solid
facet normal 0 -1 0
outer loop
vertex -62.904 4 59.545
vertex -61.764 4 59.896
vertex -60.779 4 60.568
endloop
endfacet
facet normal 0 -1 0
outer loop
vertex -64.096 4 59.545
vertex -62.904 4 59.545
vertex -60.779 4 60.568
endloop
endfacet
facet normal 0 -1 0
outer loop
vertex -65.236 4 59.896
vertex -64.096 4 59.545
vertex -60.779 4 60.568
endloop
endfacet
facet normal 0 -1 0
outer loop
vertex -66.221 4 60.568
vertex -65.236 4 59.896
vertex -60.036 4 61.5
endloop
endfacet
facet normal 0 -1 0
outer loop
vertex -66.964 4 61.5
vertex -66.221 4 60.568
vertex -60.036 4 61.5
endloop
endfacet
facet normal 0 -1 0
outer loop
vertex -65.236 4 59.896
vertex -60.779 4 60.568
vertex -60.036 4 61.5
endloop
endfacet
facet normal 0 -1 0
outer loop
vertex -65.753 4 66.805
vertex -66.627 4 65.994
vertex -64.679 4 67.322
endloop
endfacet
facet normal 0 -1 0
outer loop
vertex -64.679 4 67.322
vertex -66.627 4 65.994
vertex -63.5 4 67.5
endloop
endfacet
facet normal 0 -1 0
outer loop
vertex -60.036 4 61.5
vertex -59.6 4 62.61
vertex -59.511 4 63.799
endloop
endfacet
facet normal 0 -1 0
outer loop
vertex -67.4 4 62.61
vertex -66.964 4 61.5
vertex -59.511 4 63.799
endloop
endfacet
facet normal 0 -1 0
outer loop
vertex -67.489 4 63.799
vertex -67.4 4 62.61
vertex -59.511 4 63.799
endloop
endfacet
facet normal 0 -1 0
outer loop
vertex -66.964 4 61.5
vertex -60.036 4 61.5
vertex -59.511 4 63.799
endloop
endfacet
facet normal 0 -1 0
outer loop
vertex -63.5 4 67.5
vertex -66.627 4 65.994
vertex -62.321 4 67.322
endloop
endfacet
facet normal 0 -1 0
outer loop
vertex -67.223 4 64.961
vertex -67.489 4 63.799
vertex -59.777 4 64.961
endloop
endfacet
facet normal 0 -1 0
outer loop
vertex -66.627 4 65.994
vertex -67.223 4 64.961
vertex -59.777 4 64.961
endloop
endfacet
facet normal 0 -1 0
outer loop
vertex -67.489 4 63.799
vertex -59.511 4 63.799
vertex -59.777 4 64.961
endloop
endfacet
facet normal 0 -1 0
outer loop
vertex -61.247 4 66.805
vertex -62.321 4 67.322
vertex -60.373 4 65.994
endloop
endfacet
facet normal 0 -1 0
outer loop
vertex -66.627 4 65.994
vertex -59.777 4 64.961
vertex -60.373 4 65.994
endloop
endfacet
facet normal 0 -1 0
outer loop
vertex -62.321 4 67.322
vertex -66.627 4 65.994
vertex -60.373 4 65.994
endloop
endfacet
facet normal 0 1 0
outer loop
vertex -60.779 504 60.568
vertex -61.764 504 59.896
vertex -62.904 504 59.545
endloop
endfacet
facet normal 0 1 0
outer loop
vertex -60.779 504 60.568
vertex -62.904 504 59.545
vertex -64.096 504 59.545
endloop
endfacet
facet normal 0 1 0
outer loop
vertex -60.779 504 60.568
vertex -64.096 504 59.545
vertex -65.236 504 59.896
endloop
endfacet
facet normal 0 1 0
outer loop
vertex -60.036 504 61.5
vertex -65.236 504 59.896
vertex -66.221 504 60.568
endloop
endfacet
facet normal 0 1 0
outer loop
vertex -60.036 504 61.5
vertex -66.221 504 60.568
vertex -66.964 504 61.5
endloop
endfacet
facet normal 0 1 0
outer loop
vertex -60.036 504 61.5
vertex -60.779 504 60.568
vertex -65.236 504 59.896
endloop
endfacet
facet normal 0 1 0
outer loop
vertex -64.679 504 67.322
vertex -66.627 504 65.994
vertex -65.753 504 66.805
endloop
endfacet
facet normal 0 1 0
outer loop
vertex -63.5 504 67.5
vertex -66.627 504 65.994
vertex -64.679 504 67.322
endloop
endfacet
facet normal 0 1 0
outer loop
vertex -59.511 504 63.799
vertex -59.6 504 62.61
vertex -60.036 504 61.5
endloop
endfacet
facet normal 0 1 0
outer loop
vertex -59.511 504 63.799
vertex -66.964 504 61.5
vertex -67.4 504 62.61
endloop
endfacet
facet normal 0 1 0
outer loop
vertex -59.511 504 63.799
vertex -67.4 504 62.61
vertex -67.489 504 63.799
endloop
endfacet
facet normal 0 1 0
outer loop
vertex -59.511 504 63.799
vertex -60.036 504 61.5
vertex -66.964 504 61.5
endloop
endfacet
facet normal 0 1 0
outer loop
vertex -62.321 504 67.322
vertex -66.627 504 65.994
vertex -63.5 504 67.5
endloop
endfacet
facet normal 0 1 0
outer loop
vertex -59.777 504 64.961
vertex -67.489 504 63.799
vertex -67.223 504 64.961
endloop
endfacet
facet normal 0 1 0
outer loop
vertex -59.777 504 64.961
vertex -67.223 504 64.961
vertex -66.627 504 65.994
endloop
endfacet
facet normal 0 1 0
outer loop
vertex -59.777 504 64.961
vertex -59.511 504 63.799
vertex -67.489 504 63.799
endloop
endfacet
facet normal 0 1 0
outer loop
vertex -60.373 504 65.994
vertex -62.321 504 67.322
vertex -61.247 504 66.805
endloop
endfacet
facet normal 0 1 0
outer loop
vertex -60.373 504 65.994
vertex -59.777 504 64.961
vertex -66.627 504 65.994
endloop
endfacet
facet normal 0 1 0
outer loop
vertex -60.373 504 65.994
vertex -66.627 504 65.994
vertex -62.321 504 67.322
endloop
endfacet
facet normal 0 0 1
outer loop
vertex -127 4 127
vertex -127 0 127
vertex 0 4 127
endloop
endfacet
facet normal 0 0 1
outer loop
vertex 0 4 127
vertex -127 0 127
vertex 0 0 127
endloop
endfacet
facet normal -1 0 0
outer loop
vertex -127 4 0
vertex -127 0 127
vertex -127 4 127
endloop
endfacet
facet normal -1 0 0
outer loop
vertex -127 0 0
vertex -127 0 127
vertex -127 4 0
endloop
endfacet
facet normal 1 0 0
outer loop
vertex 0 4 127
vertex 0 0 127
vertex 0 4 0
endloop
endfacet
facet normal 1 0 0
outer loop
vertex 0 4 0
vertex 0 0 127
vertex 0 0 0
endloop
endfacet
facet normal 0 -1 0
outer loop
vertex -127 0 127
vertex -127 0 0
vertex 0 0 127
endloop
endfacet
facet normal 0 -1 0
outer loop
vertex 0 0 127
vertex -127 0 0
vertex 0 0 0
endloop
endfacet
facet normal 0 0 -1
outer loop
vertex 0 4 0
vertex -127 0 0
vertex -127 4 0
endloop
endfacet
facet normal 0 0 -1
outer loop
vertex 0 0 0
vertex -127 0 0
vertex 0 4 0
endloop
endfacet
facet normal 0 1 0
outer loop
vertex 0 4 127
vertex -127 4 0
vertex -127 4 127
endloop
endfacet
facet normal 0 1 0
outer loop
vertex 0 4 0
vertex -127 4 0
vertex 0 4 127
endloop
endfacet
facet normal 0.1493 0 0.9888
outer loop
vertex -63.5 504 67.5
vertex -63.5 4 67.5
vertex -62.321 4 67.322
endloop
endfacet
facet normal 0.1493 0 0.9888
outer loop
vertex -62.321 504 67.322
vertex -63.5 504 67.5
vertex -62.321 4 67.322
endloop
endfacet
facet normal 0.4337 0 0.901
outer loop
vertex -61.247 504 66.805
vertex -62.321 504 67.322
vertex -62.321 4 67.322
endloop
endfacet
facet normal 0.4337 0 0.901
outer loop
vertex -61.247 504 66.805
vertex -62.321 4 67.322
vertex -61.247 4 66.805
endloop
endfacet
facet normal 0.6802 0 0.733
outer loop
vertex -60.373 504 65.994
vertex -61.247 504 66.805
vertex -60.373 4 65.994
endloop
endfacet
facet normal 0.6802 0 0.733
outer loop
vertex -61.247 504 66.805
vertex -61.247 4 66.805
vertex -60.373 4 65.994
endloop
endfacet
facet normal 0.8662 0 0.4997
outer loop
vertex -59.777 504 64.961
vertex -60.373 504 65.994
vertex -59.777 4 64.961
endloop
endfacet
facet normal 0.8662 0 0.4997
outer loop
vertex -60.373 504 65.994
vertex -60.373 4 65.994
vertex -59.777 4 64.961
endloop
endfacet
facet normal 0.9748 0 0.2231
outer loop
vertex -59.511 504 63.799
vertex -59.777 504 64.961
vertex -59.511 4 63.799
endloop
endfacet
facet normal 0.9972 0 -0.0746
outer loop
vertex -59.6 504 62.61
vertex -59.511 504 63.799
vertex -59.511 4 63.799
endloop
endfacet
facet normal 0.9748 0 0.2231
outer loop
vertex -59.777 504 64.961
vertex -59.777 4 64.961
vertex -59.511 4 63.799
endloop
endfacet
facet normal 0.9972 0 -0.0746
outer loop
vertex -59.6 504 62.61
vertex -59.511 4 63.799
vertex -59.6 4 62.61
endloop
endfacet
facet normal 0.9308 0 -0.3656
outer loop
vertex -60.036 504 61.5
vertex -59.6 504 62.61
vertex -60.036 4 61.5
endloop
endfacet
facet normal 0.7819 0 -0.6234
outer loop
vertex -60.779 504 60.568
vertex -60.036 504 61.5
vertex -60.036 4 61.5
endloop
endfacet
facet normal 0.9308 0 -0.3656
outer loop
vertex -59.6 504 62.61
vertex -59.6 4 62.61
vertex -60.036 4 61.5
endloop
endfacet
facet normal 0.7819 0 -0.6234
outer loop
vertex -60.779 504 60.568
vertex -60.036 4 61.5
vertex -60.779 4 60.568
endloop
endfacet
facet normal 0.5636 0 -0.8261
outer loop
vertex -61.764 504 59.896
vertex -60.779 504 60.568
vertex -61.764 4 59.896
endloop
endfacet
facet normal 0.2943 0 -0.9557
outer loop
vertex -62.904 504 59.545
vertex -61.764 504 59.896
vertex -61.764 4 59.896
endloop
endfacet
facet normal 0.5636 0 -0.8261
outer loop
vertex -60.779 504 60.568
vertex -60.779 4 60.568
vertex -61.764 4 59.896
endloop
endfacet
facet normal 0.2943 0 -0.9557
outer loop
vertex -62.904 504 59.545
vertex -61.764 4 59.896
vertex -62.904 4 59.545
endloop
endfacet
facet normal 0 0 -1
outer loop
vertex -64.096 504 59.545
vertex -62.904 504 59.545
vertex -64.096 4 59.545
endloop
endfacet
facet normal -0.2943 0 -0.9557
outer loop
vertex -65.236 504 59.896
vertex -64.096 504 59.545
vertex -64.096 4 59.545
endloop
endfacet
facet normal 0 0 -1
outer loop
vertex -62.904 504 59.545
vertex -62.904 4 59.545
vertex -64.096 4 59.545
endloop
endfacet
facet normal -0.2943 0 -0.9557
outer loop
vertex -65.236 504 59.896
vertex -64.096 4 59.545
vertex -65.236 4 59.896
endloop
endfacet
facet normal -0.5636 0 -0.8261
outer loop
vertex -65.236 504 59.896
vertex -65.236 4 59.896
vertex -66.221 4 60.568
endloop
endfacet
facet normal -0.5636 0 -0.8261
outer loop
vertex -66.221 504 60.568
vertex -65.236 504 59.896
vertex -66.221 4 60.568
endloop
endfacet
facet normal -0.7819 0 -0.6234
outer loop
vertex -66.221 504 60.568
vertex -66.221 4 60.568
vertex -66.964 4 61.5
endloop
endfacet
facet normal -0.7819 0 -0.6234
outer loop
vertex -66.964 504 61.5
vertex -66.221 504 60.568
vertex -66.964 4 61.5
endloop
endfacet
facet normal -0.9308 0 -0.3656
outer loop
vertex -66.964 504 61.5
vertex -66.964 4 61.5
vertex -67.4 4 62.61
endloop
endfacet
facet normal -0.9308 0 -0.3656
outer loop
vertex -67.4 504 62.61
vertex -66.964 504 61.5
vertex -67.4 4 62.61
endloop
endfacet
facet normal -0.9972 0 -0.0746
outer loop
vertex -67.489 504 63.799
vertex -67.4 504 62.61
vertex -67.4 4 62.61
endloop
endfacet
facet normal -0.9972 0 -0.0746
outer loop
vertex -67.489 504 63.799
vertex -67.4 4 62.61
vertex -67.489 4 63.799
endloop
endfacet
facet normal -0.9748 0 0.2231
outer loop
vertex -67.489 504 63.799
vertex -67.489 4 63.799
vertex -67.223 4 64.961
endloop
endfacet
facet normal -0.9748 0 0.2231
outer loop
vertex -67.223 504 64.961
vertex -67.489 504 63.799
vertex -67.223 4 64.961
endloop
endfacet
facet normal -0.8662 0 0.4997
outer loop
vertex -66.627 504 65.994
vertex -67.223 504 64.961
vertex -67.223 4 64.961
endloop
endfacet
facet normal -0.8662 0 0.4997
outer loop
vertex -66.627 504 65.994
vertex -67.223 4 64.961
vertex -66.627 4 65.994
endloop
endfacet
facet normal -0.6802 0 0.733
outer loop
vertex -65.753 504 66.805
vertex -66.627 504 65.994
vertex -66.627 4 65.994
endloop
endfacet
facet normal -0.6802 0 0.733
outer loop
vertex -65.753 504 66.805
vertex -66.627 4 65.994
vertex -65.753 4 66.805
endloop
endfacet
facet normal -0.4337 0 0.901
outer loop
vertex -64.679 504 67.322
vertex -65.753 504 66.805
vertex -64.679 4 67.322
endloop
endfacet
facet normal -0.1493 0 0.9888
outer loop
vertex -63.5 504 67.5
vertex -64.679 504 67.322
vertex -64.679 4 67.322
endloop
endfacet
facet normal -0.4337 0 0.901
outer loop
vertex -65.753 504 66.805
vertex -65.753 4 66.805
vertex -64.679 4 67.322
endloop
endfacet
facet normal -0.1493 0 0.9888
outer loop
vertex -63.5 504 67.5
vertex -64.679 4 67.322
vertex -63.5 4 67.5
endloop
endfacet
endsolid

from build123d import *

# Parameters (mm, degrees)
SKETCH1_W           = 127
SKETCH1_H           = 127
BOSS_EXTRUDE1_DEPTH = 4
SKETCH2_R           = 4
BOSS_EXTRUDE2_DEPTH = 500


with BuildPart() as part:
    # Sketch1 → Boss-Extrude1 (new body)
    with BuildSketch(Plane(origin=(0, 0, 0), x_dir=(1, 0, 0), z_dir=(0, 1, 0))):
        with Locations((-63.5, -63.5)):
            Rectangle(SKETCH1_W, SKETCH1_H)
    extrude(amount=BOSS_EXTRUDE1_DEPTH)


with BuildPart() as body_2:
    # Sketch2 → Boss-Extrude2 (new body)
    with BuildSketch(Plane(origin=(0, 4, 0), x_dir=(1, 0, 0), z_dir=(0, 1, 0))):
        with Locations(Location((-63.5, -63.5, 0), (0, 0, 270))):
            Circle(SKETCH2_R)
    extrude(amount=BOSS_EXTRUDE2_DEPTH)


solid = Compound([part.part, body_2.part])
